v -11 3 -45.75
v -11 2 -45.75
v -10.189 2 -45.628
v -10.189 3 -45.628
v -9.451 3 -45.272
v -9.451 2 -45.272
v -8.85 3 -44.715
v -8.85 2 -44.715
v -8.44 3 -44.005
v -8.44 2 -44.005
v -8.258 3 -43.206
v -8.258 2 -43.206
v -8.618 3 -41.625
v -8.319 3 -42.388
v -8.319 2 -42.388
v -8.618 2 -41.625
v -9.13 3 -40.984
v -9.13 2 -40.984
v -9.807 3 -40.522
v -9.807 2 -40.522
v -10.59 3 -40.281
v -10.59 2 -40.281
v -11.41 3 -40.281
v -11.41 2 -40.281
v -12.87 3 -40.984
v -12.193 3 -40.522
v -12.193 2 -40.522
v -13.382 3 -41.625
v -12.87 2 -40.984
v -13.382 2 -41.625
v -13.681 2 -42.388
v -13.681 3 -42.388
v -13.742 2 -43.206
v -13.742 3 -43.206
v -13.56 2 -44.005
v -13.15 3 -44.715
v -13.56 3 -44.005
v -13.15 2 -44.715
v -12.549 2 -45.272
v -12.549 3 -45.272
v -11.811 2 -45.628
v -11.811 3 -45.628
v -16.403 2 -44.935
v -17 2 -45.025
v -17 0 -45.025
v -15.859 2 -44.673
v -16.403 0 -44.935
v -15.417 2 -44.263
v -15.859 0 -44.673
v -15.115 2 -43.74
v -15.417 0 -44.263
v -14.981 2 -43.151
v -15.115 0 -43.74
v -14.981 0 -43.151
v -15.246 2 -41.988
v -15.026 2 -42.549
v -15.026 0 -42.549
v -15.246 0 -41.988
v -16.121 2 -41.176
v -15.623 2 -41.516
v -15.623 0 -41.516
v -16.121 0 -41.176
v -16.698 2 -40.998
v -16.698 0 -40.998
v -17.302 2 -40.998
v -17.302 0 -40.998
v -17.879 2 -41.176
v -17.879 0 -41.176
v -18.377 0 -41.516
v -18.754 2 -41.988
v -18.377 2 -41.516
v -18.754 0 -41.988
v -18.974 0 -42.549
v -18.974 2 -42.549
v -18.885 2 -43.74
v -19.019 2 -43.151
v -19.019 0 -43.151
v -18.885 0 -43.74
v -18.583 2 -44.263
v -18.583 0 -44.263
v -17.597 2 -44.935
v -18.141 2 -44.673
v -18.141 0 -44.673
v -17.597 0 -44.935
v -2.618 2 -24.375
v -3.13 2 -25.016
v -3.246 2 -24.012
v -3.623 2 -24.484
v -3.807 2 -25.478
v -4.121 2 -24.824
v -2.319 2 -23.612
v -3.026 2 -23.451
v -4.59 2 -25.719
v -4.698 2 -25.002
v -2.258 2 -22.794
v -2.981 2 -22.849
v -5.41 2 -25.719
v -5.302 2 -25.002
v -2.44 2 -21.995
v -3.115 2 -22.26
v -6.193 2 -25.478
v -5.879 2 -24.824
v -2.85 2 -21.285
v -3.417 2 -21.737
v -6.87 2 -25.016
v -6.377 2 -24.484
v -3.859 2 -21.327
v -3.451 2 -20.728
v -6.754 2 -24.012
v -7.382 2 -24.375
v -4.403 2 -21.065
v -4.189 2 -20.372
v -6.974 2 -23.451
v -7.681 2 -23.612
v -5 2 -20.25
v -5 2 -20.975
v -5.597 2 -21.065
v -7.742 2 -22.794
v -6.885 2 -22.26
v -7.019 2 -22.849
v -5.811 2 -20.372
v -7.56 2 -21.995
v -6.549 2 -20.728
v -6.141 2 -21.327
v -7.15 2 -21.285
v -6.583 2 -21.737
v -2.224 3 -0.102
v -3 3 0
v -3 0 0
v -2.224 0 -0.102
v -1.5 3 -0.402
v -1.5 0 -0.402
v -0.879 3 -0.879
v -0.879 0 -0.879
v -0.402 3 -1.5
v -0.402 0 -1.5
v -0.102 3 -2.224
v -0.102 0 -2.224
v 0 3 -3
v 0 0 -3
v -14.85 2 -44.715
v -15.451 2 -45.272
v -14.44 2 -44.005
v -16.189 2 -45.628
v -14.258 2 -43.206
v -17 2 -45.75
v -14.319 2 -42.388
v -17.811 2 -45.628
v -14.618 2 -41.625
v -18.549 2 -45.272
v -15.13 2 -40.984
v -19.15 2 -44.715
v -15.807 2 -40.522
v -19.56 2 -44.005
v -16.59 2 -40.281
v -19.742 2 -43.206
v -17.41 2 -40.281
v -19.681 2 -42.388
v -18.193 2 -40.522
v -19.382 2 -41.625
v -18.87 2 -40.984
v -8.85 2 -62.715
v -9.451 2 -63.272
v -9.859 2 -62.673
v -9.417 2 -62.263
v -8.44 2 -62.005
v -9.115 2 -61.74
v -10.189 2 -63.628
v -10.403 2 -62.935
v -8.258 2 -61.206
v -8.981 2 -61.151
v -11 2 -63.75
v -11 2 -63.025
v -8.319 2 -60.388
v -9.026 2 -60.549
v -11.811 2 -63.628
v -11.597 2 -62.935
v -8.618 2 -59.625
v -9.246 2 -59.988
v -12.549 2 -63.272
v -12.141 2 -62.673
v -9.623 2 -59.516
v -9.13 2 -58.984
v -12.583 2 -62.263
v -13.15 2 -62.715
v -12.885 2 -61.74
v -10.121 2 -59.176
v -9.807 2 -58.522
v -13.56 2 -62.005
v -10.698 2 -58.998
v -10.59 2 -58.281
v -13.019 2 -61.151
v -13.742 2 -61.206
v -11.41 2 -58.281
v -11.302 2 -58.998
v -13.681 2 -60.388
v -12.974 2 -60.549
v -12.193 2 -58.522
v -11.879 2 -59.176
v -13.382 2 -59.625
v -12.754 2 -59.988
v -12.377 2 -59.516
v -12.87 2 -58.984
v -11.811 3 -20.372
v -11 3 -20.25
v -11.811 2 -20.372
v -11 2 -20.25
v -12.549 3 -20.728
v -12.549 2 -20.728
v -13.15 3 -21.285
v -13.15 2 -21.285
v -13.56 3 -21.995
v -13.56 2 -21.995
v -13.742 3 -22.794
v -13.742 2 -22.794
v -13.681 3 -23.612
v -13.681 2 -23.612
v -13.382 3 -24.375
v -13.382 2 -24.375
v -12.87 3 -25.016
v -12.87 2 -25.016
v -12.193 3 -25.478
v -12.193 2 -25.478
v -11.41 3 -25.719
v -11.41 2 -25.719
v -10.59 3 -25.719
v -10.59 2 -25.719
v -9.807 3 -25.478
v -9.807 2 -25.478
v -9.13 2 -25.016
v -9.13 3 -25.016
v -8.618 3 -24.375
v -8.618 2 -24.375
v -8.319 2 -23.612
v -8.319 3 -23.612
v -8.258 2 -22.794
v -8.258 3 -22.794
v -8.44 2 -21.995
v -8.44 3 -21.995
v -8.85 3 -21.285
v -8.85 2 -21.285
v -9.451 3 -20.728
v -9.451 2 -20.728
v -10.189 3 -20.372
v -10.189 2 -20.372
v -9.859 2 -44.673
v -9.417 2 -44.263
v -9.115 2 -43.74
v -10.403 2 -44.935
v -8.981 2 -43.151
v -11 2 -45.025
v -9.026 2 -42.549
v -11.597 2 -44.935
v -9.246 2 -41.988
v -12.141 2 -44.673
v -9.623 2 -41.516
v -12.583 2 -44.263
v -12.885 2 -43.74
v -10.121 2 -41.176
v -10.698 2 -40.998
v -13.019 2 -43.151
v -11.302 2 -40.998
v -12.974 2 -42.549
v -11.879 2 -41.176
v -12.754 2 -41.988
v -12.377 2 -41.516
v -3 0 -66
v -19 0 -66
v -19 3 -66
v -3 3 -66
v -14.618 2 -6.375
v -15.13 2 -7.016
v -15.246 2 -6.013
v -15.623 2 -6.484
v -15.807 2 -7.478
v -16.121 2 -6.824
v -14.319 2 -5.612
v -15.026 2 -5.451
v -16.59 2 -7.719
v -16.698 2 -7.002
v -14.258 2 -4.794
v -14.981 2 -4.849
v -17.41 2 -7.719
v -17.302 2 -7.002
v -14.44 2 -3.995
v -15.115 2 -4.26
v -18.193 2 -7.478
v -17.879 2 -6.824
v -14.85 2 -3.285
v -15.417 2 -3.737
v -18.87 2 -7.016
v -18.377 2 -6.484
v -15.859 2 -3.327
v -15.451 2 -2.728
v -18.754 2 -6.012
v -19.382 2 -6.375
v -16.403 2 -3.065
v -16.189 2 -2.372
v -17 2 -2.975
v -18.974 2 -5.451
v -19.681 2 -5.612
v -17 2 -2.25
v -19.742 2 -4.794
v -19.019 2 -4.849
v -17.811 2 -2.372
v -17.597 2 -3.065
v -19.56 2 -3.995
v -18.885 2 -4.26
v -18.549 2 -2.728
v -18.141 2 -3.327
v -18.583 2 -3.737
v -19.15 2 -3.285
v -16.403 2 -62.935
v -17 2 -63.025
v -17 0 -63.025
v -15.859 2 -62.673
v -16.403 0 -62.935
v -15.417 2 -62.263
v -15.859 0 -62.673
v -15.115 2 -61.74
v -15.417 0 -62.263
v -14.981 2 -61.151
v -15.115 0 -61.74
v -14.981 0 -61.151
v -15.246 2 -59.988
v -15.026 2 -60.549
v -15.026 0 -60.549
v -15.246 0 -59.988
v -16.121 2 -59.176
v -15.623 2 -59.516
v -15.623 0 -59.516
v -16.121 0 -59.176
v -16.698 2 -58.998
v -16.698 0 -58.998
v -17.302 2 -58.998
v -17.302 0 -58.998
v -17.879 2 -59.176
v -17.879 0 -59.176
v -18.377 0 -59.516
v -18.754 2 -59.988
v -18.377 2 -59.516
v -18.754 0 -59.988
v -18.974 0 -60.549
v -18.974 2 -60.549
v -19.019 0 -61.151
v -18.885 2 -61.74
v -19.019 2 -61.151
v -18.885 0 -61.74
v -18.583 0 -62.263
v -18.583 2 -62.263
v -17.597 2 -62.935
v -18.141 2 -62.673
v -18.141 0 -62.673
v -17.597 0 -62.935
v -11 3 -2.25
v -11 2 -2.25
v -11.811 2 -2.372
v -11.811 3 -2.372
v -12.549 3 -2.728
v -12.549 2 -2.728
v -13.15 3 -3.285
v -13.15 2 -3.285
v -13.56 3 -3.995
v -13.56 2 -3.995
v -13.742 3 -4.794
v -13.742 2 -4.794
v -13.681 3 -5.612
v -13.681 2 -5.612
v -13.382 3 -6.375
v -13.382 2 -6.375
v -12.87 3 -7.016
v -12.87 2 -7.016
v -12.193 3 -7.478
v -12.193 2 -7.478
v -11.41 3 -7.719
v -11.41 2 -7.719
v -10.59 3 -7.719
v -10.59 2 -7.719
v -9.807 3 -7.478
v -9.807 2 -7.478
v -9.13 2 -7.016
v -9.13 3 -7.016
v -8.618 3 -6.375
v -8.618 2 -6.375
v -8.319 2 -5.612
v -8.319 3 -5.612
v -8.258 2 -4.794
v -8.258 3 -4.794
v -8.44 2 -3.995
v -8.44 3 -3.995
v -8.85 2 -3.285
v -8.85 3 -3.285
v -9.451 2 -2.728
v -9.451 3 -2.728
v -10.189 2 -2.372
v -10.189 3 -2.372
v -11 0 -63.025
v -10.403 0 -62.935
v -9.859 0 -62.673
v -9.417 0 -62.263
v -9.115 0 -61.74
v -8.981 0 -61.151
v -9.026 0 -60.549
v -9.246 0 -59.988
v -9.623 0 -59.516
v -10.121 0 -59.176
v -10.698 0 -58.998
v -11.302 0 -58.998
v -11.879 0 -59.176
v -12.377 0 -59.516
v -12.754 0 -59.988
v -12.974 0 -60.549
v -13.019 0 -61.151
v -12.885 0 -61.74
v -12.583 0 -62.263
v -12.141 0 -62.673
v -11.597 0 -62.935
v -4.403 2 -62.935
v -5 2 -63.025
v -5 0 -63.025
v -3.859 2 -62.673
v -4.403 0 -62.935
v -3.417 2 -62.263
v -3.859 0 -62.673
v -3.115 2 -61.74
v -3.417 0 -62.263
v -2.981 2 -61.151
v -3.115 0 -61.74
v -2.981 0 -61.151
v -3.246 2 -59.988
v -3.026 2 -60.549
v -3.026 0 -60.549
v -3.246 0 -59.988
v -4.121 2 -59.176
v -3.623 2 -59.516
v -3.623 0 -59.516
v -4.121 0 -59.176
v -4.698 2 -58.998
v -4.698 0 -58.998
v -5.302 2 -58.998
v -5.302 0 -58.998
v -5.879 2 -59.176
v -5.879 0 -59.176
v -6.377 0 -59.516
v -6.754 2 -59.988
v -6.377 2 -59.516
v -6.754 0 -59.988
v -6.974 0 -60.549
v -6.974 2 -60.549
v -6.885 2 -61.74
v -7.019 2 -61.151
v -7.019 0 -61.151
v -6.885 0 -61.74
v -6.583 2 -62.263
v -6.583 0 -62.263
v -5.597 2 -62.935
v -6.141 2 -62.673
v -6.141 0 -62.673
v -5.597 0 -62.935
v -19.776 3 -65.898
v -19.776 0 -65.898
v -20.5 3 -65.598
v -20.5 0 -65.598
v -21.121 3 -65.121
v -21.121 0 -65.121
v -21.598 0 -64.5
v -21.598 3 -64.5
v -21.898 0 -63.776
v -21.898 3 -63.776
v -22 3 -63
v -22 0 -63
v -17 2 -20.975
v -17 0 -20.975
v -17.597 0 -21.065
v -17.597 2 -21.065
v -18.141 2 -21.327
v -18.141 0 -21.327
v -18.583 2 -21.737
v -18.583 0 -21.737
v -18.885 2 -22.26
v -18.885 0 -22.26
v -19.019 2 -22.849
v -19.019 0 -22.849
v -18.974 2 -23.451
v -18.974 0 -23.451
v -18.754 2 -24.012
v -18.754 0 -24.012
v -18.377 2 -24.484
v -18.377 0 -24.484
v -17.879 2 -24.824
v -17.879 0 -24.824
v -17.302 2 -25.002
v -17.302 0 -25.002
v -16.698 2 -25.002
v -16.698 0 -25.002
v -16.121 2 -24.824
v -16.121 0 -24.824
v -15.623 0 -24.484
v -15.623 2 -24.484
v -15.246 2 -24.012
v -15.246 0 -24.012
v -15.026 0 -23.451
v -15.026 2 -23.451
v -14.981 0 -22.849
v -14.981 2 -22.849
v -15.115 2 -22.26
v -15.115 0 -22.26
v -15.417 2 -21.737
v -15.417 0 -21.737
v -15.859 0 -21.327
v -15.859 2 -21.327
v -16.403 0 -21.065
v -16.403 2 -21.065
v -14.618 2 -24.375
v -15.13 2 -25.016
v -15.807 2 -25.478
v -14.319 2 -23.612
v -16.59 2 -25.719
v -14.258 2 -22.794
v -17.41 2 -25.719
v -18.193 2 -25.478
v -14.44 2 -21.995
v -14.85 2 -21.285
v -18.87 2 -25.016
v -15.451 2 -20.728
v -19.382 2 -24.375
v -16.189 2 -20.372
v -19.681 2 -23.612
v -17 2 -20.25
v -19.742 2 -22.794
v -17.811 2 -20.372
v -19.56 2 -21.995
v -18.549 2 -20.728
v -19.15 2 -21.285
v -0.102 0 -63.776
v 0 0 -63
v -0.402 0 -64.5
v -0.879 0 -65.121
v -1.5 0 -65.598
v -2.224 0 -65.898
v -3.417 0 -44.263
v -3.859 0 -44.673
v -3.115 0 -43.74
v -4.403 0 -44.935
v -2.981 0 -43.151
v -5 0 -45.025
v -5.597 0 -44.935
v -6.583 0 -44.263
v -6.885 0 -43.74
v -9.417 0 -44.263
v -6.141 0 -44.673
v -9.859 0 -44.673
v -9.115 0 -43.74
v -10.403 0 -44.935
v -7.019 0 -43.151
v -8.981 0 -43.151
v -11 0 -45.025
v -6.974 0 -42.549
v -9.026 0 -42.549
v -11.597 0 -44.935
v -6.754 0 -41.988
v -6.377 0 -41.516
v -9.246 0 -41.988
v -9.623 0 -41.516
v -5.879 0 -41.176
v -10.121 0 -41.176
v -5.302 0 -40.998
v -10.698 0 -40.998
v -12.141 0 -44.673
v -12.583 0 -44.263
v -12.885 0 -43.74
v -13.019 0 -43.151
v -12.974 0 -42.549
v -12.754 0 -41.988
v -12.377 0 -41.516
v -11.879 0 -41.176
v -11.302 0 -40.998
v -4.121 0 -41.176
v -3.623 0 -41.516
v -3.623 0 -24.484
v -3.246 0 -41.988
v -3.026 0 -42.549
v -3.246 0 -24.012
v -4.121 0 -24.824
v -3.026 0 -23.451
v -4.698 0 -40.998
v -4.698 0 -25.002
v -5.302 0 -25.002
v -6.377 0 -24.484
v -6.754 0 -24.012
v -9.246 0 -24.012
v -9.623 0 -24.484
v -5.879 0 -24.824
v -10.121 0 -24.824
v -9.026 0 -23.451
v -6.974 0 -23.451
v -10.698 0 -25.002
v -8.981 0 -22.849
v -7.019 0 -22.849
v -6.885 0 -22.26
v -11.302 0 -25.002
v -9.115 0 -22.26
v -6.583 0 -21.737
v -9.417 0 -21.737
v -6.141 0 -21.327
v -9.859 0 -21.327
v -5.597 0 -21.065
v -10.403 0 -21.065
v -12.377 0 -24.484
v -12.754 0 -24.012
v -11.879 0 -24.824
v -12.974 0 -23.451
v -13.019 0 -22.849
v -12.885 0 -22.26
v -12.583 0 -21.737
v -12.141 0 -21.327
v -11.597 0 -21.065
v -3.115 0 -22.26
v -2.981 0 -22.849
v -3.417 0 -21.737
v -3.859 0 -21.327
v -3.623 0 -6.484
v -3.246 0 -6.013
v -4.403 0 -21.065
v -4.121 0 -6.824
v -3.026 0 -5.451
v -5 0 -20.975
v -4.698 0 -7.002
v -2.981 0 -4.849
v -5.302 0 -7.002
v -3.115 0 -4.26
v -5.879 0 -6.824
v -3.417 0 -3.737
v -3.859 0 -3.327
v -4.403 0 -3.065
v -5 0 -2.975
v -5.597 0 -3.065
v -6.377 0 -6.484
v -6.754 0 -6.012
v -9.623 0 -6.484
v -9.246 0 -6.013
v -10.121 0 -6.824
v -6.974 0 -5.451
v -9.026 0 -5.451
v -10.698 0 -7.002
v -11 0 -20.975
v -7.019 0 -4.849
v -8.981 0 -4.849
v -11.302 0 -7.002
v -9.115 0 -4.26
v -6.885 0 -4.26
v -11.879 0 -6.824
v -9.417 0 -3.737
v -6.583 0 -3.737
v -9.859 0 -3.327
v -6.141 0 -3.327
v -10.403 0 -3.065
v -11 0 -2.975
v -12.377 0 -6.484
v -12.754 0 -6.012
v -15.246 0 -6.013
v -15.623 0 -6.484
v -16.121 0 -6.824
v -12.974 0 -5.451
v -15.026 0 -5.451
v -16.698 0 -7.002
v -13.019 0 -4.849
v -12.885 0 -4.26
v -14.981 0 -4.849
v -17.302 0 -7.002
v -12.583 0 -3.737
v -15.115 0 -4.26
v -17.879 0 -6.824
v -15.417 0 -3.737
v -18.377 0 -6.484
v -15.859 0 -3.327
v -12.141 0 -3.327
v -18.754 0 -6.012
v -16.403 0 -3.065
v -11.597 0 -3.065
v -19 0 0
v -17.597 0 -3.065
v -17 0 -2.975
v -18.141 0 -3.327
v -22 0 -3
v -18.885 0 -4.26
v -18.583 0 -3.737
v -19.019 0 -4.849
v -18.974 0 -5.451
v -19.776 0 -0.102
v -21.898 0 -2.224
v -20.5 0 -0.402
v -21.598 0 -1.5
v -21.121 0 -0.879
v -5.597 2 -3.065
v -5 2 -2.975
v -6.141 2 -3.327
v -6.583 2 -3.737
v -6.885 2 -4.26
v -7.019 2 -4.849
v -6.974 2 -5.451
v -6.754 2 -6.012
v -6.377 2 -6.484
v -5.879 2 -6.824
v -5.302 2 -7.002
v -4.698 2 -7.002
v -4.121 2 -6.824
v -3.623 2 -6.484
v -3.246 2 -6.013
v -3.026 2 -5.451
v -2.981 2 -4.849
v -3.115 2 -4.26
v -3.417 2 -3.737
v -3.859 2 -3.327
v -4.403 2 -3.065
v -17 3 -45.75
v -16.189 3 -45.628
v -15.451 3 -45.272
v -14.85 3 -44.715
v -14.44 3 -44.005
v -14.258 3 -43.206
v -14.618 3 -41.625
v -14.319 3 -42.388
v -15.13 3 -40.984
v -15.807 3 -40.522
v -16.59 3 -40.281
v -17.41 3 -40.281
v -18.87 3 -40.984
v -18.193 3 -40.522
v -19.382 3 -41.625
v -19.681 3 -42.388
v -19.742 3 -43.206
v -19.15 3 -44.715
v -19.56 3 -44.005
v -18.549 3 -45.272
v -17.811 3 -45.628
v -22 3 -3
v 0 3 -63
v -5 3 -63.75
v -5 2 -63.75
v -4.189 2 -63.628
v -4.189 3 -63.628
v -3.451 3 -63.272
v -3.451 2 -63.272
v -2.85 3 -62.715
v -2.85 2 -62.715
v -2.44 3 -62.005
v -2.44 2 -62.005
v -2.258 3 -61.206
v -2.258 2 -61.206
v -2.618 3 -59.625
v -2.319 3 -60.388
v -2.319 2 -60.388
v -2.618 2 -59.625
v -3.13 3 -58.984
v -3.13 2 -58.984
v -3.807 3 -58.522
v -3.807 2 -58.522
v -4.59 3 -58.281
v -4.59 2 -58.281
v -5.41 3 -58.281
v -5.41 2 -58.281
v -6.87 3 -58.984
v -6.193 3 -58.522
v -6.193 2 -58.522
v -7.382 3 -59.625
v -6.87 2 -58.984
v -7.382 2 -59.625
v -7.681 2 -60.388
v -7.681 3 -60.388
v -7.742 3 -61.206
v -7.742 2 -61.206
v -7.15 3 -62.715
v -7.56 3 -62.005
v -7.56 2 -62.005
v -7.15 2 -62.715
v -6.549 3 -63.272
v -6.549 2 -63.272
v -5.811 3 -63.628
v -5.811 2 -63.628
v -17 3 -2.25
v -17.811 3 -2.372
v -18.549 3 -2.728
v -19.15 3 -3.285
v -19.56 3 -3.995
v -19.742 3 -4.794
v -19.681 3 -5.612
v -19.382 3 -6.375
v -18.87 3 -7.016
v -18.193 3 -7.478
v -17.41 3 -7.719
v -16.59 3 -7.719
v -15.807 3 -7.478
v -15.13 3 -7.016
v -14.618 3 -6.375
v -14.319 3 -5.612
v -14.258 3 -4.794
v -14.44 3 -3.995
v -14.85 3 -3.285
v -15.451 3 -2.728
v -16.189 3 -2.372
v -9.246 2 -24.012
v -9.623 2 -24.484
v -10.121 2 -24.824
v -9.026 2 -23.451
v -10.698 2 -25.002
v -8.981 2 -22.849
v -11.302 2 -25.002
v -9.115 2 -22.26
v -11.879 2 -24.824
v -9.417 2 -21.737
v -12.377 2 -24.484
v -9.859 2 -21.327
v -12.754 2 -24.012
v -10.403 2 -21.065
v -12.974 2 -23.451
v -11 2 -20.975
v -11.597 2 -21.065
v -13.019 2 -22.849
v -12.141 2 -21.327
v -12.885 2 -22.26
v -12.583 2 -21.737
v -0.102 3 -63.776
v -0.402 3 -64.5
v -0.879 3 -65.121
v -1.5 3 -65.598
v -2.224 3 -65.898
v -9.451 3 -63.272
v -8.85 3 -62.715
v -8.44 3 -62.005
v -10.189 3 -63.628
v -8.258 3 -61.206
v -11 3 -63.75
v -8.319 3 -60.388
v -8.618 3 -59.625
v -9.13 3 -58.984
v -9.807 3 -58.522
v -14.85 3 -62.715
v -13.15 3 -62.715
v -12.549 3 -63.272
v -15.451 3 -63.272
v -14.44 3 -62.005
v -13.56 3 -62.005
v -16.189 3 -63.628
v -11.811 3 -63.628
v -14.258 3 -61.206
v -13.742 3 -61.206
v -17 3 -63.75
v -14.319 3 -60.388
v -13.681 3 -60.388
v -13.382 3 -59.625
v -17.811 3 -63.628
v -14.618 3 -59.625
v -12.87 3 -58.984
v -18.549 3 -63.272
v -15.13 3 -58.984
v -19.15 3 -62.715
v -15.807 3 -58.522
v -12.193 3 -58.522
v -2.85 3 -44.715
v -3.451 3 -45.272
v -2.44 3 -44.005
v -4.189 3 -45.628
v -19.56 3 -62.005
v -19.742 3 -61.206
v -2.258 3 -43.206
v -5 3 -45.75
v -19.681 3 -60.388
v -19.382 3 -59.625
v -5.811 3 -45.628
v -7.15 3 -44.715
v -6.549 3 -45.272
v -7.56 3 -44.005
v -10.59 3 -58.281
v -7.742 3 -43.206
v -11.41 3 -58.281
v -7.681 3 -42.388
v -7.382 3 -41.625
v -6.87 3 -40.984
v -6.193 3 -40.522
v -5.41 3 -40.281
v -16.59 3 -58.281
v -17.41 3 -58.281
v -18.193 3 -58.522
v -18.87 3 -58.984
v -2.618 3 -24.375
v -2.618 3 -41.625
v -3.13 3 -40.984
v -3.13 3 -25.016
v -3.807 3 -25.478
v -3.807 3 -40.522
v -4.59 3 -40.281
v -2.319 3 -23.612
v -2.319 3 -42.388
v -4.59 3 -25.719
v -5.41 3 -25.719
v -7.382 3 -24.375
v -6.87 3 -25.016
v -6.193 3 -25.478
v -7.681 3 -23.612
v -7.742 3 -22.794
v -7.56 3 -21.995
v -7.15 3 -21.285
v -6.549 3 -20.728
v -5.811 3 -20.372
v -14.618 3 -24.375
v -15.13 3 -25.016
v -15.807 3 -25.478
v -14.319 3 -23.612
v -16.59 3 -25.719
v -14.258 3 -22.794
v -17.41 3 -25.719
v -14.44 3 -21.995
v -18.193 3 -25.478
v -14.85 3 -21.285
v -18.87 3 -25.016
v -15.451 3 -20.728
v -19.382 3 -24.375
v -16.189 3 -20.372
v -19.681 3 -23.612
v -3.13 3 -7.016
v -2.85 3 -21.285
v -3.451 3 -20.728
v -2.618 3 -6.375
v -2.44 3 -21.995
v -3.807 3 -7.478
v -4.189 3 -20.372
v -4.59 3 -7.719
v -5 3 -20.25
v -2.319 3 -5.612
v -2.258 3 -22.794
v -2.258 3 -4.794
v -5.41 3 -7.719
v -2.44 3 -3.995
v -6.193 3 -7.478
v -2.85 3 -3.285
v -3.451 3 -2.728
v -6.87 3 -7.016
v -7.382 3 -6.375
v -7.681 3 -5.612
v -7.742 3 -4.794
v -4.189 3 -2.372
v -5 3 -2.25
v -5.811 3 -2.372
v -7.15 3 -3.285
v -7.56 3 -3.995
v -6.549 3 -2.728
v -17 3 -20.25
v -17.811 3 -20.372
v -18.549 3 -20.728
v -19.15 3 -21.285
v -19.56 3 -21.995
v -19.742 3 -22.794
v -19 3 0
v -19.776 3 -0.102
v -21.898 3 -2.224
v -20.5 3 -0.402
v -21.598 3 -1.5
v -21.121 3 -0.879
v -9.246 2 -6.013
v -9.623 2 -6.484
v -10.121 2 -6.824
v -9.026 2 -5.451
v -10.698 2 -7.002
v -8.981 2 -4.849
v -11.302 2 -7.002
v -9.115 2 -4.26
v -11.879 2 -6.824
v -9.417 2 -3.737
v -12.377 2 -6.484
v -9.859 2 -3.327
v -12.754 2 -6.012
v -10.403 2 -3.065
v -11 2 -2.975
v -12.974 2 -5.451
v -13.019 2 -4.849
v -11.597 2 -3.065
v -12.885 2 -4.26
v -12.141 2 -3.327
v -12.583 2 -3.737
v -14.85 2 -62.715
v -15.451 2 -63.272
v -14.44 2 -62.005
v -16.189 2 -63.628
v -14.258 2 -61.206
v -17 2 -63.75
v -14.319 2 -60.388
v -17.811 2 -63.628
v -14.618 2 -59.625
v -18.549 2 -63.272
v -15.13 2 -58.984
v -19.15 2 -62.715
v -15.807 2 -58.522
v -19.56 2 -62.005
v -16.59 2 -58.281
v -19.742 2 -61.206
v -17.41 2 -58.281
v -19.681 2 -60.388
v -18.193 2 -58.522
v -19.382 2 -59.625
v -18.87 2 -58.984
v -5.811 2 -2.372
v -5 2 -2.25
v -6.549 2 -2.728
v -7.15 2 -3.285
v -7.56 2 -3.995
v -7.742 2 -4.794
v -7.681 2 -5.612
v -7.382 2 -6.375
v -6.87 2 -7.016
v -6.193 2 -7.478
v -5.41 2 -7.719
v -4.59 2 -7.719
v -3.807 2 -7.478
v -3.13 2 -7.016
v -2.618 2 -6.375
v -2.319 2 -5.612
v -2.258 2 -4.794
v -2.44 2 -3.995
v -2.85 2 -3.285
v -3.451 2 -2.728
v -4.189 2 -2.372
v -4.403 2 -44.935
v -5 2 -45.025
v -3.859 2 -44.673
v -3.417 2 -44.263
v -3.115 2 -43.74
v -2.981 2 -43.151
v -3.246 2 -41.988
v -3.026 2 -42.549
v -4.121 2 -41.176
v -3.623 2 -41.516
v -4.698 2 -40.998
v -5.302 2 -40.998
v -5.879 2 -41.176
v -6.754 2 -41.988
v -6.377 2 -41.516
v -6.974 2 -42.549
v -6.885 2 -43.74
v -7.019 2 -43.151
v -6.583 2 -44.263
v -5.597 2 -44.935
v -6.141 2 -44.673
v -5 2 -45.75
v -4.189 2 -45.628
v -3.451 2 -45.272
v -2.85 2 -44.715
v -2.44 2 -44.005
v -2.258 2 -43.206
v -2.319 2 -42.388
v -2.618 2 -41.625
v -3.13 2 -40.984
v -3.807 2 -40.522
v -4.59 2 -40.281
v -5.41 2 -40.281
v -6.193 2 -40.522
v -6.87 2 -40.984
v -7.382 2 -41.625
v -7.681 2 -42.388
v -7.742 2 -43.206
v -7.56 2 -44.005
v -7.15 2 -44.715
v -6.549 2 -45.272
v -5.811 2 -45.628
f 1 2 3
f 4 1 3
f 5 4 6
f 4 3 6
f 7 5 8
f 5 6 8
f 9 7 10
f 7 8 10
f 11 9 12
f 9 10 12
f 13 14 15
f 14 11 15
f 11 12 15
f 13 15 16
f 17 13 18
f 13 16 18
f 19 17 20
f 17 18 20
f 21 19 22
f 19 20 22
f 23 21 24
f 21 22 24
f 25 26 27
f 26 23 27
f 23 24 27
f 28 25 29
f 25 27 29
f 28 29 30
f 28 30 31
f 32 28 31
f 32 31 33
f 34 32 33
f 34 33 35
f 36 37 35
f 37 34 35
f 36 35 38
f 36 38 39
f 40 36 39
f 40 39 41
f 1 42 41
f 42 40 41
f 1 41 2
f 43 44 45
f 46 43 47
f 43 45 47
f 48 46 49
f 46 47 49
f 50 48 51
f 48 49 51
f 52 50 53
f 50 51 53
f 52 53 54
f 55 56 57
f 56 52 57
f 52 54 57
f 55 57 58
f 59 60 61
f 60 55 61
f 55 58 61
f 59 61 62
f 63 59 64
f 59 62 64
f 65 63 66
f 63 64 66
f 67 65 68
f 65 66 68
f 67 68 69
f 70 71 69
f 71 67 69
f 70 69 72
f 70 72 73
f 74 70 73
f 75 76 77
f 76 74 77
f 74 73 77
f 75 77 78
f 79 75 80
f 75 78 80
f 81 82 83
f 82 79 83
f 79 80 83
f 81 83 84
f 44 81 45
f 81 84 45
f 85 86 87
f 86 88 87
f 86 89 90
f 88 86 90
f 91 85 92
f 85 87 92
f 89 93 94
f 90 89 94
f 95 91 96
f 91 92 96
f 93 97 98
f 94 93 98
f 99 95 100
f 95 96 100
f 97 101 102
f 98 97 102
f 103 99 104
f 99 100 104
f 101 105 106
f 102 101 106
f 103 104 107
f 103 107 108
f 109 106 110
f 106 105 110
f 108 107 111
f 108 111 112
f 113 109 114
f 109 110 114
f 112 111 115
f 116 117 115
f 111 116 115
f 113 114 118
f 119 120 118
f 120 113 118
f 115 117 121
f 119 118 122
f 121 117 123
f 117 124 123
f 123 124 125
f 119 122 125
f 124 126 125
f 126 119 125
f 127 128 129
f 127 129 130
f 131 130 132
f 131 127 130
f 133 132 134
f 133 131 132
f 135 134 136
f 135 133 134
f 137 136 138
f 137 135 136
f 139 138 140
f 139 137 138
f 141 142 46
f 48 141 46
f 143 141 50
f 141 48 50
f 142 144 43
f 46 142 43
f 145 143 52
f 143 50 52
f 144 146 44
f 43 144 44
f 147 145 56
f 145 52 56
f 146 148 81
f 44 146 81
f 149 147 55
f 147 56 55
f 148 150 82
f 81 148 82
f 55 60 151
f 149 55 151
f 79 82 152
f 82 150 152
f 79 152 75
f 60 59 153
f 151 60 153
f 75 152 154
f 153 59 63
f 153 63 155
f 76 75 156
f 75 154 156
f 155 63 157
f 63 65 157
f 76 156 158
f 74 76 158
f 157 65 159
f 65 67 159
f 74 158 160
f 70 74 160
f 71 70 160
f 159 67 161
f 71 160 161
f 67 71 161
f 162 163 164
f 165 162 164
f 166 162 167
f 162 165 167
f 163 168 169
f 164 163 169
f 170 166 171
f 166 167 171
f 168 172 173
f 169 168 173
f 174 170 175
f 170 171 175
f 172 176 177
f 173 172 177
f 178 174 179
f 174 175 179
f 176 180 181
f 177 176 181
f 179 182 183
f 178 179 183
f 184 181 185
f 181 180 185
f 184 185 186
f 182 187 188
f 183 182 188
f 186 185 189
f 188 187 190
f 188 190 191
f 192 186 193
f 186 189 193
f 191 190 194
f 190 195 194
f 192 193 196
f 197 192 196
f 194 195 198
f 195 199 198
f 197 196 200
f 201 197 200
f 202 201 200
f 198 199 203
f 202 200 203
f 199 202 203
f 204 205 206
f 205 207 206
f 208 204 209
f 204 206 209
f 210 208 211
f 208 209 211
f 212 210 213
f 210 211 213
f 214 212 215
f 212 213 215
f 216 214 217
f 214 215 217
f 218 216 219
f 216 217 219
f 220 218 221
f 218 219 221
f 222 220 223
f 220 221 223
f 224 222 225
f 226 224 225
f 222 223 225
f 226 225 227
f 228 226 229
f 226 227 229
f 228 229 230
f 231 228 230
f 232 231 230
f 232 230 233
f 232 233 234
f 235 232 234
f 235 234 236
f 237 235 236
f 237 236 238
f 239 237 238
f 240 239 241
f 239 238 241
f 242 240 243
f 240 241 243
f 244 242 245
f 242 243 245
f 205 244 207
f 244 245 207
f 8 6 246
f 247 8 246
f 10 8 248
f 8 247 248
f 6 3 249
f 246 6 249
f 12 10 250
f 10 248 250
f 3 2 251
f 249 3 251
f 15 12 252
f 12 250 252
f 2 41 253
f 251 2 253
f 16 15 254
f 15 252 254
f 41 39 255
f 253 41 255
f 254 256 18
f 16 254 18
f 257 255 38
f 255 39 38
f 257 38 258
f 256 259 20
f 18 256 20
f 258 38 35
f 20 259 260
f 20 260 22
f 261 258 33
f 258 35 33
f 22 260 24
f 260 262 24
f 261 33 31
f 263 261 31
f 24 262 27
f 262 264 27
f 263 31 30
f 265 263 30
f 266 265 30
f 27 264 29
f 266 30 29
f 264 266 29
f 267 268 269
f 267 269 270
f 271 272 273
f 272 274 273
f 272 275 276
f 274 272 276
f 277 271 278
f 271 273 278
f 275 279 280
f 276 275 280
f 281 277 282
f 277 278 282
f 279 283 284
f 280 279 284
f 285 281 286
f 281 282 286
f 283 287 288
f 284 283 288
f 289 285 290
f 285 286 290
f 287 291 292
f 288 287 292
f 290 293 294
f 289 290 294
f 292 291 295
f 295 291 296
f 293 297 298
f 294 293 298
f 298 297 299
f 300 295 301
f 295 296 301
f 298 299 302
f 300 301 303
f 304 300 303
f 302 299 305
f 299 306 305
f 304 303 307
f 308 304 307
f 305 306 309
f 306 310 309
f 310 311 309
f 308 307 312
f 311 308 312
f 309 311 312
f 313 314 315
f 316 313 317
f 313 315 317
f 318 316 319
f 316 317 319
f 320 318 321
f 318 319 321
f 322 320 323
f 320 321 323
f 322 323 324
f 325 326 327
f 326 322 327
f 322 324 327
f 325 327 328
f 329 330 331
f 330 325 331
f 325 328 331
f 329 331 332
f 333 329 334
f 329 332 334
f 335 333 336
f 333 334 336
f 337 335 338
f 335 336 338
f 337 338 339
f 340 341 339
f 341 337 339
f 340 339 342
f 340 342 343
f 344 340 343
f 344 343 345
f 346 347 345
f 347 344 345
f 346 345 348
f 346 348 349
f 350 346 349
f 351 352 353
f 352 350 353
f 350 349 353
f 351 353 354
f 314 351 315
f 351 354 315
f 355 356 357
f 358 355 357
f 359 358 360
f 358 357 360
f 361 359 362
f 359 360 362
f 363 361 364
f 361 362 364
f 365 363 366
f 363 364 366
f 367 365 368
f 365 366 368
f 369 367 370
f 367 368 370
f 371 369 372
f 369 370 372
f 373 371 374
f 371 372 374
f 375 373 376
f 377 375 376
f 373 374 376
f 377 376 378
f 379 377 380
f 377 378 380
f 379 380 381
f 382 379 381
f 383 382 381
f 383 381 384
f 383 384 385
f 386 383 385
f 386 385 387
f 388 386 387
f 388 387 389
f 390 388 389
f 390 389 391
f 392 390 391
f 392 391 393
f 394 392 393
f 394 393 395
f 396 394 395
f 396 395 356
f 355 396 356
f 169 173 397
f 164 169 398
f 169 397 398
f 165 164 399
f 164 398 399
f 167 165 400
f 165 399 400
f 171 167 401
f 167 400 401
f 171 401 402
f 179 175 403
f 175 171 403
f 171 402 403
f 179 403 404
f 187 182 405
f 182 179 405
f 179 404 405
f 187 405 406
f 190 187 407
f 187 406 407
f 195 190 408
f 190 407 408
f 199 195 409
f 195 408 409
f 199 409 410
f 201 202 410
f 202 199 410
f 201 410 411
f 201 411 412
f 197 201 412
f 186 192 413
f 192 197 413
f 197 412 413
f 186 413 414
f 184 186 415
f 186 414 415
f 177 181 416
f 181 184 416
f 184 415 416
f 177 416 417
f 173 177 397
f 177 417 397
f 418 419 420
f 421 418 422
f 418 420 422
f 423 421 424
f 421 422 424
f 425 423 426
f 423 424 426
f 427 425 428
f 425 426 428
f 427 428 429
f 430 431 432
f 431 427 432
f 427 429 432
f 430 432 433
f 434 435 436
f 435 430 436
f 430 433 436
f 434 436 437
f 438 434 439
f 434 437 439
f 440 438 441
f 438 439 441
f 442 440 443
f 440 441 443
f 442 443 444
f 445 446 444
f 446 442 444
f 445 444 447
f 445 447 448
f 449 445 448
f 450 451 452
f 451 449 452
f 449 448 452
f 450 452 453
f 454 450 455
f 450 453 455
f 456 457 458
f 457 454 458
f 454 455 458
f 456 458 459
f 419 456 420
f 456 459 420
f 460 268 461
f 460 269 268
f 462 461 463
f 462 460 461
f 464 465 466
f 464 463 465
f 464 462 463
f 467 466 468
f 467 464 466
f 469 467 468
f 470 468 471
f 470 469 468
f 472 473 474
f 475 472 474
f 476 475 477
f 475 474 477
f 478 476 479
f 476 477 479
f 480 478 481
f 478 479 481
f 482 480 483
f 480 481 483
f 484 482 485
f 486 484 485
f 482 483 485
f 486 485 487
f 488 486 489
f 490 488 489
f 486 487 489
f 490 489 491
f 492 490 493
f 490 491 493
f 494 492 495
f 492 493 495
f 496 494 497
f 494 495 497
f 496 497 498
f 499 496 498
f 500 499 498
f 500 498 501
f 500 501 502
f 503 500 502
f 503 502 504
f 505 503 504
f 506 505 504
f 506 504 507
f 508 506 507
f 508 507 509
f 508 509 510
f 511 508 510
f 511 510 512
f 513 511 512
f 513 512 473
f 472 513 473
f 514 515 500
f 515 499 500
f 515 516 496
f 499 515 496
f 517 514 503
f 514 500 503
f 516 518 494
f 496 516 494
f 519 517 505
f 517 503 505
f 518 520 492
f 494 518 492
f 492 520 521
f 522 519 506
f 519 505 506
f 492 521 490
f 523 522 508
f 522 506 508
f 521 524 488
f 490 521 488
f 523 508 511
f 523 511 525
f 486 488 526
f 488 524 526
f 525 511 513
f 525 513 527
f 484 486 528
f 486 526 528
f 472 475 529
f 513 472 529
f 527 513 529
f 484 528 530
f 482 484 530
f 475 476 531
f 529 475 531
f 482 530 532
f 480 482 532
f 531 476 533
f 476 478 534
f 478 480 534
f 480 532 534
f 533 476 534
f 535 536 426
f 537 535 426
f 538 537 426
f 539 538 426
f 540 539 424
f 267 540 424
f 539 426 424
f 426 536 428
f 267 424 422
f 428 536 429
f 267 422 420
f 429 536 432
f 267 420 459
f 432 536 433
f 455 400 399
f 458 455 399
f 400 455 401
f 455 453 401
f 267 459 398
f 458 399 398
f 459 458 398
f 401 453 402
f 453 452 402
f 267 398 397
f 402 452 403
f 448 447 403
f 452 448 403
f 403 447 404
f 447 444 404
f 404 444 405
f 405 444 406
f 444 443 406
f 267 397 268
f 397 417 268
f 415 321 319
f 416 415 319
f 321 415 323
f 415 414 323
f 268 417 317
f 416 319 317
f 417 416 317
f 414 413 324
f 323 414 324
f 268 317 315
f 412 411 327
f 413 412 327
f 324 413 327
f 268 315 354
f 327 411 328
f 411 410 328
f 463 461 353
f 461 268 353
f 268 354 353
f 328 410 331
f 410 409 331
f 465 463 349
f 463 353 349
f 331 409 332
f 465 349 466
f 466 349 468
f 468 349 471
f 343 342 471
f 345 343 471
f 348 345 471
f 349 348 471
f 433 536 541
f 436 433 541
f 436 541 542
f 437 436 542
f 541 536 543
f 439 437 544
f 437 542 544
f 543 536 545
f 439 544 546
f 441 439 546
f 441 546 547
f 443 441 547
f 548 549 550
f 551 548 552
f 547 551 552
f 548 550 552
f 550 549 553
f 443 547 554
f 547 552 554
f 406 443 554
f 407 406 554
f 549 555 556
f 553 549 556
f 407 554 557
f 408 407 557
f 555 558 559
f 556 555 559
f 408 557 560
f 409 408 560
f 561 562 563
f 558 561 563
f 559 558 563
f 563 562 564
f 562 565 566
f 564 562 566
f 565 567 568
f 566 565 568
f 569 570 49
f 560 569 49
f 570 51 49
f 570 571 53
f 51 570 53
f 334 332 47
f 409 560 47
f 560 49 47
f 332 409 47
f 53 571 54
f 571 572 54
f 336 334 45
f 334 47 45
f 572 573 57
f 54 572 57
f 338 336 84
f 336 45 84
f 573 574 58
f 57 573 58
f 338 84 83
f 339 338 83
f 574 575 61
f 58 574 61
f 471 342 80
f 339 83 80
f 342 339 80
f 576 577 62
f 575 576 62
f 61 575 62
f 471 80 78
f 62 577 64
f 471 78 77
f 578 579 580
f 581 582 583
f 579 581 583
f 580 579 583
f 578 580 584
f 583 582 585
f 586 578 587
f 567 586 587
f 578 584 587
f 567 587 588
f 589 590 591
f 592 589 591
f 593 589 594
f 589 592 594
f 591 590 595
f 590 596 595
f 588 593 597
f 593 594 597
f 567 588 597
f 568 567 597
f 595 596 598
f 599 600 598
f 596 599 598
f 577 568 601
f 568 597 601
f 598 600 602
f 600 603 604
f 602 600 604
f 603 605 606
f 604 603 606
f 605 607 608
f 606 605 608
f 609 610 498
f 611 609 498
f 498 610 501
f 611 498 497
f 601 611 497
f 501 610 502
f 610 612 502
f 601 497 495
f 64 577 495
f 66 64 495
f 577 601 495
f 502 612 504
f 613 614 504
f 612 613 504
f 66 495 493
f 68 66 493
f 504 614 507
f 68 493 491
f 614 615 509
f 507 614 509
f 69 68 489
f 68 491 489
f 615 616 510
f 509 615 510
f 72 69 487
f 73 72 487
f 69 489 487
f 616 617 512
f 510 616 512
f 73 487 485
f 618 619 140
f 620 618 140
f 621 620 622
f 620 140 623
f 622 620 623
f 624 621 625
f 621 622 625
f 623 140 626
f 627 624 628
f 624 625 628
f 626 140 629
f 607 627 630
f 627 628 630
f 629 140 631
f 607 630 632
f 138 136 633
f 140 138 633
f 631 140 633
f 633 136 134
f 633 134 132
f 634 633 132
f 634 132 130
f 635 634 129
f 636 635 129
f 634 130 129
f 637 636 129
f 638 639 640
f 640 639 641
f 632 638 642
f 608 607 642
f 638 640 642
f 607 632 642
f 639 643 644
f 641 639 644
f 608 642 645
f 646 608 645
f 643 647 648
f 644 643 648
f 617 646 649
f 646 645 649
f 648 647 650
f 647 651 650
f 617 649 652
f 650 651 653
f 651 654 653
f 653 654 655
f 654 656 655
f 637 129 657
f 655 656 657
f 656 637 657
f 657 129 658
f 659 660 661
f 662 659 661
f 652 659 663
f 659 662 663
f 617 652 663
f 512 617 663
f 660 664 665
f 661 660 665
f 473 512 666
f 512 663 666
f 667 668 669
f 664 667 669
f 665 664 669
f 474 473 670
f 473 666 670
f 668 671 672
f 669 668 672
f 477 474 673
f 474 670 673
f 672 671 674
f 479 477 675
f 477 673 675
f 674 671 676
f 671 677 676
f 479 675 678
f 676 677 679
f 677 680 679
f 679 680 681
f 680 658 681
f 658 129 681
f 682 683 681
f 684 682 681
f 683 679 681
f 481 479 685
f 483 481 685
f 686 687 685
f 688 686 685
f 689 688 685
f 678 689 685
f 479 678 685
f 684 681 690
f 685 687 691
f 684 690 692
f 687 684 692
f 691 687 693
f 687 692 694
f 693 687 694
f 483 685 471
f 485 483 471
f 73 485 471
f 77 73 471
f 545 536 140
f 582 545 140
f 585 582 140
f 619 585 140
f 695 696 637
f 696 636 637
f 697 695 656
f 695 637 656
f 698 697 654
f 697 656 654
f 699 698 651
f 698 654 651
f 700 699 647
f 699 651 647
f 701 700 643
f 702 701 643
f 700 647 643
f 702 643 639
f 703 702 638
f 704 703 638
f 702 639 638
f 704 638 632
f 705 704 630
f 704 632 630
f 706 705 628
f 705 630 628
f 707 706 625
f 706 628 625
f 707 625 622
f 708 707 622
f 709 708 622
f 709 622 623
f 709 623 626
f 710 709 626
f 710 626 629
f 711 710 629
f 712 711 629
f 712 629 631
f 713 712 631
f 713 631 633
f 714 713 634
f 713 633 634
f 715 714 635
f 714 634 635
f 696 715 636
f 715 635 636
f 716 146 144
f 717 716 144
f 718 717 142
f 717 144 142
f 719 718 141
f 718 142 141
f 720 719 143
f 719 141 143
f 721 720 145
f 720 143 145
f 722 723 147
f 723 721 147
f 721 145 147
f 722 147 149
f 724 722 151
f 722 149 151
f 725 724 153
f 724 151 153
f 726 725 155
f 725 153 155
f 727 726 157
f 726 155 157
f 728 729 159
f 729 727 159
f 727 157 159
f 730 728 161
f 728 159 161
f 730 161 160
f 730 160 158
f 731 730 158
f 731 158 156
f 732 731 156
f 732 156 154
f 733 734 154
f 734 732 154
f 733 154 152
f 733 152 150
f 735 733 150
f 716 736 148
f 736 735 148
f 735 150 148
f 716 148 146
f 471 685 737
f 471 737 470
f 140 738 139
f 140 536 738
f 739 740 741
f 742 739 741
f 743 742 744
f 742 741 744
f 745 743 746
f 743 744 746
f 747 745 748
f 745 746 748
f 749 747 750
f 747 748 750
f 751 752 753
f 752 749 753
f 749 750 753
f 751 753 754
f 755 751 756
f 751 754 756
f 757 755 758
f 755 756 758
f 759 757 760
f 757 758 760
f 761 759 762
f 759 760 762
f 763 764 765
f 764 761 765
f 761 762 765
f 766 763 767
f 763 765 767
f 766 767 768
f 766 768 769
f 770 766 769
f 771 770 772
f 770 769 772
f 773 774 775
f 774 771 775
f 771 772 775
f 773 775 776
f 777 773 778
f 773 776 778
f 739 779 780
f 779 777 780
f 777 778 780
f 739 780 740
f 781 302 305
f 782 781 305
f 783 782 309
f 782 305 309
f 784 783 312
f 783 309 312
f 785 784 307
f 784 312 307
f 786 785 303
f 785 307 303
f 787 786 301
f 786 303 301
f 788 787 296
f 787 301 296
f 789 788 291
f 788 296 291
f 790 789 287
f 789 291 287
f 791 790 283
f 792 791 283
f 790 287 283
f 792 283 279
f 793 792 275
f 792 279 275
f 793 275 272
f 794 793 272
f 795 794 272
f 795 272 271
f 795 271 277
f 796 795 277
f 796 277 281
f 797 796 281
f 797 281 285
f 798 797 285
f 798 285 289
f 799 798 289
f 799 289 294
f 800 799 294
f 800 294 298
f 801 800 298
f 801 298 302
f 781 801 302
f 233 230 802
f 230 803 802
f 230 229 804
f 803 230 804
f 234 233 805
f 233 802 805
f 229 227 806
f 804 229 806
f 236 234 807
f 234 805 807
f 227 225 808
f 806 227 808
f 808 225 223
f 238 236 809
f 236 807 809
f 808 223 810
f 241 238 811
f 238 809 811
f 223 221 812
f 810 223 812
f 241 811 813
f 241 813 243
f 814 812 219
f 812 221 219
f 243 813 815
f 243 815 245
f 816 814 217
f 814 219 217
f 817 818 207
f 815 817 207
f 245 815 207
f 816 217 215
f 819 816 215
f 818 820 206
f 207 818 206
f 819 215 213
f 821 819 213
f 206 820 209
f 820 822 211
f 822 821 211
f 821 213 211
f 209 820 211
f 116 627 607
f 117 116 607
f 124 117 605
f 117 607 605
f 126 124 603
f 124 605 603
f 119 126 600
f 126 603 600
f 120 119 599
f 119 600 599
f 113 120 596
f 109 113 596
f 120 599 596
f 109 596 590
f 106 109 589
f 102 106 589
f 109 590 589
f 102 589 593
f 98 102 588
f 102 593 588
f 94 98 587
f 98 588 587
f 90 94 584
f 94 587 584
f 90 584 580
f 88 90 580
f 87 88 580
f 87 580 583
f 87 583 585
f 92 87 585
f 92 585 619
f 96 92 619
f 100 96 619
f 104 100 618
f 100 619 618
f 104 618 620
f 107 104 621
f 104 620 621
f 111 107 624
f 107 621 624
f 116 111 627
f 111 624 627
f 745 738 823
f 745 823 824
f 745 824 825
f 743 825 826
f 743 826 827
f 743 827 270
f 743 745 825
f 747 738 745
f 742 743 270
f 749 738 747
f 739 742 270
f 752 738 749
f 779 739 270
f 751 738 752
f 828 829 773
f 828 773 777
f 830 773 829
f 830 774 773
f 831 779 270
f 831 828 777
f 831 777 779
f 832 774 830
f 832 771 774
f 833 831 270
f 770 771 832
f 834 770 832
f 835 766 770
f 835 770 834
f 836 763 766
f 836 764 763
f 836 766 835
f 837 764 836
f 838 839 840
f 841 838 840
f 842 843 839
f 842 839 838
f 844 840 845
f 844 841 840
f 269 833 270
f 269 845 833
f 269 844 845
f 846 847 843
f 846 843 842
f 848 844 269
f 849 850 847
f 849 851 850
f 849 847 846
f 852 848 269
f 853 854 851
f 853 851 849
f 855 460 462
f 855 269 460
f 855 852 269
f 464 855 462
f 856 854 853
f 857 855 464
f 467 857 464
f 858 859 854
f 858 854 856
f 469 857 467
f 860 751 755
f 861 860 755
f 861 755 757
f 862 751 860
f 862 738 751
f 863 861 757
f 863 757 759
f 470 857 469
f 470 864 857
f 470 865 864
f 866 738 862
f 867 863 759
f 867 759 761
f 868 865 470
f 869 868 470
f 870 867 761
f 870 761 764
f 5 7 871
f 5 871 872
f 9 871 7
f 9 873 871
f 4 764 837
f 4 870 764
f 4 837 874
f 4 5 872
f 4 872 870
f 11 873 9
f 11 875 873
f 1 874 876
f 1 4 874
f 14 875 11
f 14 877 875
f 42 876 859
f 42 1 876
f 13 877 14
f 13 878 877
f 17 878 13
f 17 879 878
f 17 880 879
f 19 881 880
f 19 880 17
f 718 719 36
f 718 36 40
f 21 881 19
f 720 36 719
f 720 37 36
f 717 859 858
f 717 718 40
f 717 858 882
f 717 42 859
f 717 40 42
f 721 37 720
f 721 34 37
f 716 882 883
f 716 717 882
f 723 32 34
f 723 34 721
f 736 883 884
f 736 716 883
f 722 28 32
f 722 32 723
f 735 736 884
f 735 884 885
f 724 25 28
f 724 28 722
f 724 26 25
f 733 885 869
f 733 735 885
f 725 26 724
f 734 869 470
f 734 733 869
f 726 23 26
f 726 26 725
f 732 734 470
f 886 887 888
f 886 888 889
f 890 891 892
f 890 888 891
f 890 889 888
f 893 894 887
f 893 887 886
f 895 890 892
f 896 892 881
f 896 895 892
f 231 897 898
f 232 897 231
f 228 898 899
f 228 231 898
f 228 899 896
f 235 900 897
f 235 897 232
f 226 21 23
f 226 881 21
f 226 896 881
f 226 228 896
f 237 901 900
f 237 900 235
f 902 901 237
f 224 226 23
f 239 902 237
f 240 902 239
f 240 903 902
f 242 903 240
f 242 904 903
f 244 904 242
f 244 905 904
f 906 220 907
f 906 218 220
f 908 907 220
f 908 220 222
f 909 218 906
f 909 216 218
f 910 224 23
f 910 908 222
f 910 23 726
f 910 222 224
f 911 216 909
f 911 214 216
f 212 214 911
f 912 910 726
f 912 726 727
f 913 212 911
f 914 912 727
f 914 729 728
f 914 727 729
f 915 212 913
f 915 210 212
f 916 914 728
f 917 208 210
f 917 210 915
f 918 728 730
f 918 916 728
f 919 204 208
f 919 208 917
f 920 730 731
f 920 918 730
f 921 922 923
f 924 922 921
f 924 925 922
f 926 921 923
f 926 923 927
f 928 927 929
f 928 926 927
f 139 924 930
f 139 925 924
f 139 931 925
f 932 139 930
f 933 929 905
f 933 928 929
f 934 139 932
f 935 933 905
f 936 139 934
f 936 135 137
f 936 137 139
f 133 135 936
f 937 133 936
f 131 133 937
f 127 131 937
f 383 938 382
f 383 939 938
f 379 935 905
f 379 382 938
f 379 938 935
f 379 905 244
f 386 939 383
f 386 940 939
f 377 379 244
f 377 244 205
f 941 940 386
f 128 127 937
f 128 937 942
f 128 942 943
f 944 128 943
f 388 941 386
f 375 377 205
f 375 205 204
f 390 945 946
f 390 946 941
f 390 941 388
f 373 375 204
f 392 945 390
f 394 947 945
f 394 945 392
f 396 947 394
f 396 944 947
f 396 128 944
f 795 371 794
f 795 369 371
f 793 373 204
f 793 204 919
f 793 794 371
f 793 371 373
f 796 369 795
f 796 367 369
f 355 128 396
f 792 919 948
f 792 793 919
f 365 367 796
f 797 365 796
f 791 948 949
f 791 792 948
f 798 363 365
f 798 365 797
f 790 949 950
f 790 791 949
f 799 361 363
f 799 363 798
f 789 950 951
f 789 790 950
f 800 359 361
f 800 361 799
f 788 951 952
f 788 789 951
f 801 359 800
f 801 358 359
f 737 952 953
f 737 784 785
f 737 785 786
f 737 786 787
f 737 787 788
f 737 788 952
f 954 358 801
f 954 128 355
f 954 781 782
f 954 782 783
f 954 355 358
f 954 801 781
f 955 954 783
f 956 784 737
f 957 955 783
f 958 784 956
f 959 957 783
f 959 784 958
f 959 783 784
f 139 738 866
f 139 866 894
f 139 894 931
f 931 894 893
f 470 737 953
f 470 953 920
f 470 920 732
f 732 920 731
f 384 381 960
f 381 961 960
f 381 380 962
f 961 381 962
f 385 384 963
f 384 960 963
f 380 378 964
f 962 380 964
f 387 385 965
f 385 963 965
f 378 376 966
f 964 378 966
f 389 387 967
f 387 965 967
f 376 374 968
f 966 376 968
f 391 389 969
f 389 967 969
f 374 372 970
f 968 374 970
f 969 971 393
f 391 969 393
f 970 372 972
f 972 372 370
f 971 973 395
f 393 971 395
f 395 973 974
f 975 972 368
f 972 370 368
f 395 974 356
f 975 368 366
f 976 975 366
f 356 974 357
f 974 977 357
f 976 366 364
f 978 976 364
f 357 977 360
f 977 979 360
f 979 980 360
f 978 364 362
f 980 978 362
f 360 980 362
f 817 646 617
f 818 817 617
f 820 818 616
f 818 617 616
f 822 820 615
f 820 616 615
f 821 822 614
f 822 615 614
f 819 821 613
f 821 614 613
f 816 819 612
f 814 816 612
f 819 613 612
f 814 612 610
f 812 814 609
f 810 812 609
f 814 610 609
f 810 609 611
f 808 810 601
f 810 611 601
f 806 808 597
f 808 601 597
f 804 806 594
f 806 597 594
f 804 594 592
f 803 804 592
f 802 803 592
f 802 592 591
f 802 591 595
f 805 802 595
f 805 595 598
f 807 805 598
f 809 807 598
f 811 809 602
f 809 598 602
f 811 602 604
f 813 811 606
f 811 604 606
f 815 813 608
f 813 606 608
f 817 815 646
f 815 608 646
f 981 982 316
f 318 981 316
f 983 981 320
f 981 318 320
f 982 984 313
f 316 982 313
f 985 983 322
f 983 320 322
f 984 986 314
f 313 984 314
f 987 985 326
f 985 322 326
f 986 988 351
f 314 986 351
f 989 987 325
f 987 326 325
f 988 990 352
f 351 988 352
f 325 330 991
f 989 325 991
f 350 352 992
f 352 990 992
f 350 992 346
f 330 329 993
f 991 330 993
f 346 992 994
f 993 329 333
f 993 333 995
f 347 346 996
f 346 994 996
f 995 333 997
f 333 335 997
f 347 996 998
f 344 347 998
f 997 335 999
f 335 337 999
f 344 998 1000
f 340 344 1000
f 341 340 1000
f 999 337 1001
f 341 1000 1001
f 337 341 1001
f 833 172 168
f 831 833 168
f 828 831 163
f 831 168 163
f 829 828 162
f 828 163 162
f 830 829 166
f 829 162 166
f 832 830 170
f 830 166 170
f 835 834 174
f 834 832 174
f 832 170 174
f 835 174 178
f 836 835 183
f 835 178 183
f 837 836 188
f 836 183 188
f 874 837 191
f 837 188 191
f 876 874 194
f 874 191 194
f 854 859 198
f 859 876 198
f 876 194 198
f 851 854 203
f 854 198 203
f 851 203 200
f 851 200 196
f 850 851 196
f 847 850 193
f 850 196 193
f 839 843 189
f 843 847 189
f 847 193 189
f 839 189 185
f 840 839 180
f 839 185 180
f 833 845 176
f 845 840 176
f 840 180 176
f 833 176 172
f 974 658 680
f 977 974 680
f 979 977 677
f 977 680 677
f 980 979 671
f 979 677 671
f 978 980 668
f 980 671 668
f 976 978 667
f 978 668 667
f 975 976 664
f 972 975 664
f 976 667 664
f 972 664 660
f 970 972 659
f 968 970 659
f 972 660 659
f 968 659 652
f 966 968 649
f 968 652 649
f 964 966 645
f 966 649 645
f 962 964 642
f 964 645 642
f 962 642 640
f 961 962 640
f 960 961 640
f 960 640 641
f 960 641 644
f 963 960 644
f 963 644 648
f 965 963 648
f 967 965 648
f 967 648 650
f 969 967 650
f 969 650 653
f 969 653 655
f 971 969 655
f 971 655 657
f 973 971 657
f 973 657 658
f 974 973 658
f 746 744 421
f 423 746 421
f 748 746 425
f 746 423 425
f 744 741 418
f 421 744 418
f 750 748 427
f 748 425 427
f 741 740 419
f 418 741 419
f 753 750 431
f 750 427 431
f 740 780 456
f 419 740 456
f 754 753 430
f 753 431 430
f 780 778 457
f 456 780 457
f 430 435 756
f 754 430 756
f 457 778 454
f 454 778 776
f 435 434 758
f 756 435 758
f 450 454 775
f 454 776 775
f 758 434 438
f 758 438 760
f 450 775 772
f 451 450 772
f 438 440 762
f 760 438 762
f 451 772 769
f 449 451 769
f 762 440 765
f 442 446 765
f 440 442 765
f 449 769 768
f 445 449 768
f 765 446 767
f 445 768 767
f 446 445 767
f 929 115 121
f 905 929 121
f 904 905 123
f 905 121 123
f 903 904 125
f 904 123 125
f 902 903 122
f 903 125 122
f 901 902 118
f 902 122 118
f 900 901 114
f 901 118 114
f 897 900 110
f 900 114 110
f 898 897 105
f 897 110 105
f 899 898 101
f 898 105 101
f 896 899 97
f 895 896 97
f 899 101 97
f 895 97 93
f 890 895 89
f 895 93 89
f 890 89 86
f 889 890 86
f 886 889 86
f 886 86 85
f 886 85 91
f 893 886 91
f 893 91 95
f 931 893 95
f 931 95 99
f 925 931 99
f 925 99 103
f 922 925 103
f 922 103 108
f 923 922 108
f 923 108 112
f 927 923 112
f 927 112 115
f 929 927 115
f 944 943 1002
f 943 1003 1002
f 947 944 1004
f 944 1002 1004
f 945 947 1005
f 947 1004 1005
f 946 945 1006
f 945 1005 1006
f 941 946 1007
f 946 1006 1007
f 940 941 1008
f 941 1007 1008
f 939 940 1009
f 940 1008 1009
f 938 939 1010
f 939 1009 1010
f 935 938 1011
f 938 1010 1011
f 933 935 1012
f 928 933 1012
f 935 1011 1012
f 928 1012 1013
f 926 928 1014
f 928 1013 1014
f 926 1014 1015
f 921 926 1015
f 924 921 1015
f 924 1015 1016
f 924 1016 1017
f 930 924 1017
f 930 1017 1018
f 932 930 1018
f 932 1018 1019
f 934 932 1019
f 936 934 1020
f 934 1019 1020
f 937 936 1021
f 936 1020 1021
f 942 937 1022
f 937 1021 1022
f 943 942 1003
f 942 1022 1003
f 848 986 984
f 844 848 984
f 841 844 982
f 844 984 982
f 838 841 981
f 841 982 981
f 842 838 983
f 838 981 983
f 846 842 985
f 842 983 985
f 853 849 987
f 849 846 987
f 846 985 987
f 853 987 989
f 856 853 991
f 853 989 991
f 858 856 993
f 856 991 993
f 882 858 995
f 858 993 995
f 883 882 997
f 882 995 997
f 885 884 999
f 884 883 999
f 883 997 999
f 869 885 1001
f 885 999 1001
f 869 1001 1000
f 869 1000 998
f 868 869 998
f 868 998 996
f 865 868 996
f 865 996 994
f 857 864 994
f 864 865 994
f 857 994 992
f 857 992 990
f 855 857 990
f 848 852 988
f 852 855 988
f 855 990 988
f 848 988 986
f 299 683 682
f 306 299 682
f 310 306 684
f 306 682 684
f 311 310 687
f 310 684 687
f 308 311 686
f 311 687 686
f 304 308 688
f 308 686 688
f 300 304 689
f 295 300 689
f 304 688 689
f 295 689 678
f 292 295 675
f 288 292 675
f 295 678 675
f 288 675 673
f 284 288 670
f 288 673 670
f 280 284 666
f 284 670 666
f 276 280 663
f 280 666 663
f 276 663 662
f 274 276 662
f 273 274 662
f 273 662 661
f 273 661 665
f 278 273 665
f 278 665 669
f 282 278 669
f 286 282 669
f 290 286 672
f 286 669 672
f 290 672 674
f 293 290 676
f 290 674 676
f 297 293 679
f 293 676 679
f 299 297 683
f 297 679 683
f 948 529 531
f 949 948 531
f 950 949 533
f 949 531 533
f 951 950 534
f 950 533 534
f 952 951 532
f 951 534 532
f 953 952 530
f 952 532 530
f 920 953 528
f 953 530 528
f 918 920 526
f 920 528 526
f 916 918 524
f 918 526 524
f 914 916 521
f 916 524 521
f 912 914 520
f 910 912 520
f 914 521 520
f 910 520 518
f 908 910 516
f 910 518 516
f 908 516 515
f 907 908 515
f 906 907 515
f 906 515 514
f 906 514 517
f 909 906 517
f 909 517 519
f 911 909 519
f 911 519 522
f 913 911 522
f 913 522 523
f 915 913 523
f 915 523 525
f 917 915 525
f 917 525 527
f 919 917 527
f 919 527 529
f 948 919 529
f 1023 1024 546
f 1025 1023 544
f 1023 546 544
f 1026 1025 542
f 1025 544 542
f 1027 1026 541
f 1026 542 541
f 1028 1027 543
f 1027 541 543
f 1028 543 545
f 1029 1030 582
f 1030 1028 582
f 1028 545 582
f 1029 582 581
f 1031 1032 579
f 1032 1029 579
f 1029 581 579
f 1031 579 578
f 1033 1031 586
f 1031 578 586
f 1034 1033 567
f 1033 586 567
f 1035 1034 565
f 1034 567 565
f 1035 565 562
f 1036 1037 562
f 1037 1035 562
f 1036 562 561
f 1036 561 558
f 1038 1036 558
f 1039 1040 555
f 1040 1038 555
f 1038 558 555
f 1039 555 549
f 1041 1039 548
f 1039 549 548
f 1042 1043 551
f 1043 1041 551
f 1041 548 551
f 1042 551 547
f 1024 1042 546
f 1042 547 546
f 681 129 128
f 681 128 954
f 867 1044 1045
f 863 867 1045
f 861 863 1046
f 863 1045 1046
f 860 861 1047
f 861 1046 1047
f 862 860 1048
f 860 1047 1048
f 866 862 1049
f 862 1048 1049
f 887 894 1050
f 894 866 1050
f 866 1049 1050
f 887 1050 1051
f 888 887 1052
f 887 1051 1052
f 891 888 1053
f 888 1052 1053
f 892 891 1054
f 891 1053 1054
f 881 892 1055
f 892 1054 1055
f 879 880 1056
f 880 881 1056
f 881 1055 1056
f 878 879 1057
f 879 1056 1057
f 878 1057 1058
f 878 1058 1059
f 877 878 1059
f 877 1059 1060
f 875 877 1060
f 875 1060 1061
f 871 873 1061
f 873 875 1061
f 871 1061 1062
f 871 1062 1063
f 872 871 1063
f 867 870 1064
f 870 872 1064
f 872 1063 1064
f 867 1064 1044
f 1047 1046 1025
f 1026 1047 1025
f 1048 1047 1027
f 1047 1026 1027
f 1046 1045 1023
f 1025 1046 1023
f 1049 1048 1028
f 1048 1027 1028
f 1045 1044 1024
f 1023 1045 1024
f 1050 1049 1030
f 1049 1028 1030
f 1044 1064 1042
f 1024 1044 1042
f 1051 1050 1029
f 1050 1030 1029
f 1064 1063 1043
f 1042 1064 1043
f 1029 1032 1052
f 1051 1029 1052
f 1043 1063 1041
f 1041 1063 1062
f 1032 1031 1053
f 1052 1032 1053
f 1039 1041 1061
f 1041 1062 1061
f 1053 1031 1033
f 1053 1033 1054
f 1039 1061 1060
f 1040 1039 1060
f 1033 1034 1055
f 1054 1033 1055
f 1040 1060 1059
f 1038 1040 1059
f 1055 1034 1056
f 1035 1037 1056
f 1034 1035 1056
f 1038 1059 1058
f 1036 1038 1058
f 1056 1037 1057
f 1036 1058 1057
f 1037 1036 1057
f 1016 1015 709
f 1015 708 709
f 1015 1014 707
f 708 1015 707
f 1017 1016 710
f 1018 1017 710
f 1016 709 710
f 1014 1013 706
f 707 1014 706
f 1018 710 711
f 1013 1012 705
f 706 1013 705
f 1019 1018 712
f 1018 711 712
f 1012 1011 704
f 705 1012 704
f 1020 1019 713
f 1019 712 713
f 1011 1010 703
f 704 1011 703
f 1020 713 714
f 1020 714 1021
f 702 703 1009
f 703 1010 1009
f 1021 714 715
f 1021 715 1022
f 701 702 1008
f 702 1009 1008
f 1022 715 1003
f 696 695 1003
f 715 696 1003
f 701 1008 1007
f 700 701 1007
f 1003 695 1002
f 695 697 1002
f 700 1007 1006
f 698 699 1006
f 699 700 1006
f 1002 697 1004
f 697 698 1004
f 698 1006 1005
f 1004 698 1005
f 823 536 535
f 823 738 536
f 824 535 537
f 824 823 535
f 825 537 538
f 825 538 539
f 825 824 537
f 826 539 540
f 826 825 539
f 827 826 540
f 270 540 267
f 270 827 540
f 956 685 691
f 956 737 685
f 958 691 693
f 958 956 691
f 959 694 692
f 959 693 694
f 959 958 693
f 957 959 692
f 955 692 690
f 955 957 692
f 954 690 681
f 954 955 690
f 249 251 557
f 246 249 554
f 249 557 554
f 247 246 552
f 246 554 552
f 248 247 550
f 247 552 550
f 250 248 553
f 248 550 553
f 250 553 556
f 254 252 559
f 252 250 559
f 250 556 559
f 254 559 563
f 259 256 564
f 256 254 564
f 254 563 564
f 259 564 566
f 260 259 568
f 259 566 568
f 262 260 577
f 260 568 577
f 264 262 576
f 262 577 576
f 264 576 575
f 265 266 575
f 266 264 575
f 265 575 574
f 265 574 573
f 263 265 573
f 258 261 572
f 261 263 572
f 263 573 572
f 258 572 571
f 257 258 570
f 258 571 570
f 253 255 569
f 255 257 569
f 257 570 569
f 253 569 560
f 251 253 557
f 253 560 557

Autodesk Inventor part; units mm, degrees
ref_plane "YZ Plane" through (0, 0, 0) normal (1, 0, 0) x (0, 1, 0)
ref_plane "XZ Plane" through (0, 0, 0) normal (0, 1, 0) x (-1, 0, 0)
ref_plane "XY Plane" through (0, 0, 0) normal (0, 0, 1) x (1, 0, 0)
sketch "Esquisse1" plane through (0, 0, 0) normal (0, 1, 0) x (-1, 0, 0)
  line L0 (0, 0) -> (22, 0)
  line L1 (22, 0) -> (22, -66)
  line L2 (22, -66) -> (0, -66)
  line L3 (0, -66) -> (0, 0)
  dimension "d0" = 66
  dimension "d1" = 22
extrude "Plaque1" add sketch "Esquisse1" along normal blind 3
sketch "Esquisse2" plane through (0, 3, 0) normal (0, 1, 0) x (1, 0, 0)
  line L0 (-22, 0) -> (-22, 66) construction
  line L1 (0, 0) -> (-22, 0) construction
  line L2 (0, 66) -> (0, 0) construction
  line L3 (-22, 66) -> (0, 66) construction
  line L4 (-22, 0) -> (-22, 66) construction
  line L5 (-22, 5) -> (0, 5) construction
  line L6 (0, 66) -> (0, 0) construction
  point P0 (-11, 5)
  point P1 (-17, 5)
  point P2 (-5, 5)
  dimension "d3" = 6
  dimension "d4" = 6
  dimension "d5" = 5
hole "Perçage1" at (-11, 3, -5) at (-17, 3, -5) at (-5, 3, -5) direction (0, -1, 0) diameter 4.05 end through all counterbore diameter 5.5 counterbore depth 1
pattern_linear "Réseau rectangulaire1" count 2 spacing 18 along (0, 0, -1) of "Perçage1"
ref_plane "Plan de construction1" through (-22, 0, -33) normal (0, 0, 1) x (1, 0, 0)
mirror "Symétrie1" about plane through (-22, 0, -33) normal (0, 0, 1) of "Perçage1", "Réseau rectangulaire1"
fillet "Congé1" radius 3 4 edges at (0, 1.5, 0) (0, 1.5, -66) (-22, 1.5, -66) (-22, 1.5, 0)
equation "\"d6\" = ollo_hole"
equation "\"d8\" = ollo_ring"
equation "\"d9\" = ollo_depth"
equation "\"d11\" = Epaisseur"
equation "\"d15\" = 3 * ollo_spacing"
equation "\"LargeurGrugeage\" = Epaisseur"
equation "\"ProfondeurGrugeage\" = 0.5 * Epaisseur"
equation "\"TailleGrugeage\" = 4 * Epaisseur"
equation "\"RestesMinimum\" = 2 * Epaisseur"
equation "\"Rayondetransition\" = RayonPli"
equation "\"TailleRayonJacobi\" = RayonPli"
equation "\"TailleJeu\" = Epaisseur"
equation "\"d2\" = RayonPli"
properties part number "side" material "Plastique PMMA"
